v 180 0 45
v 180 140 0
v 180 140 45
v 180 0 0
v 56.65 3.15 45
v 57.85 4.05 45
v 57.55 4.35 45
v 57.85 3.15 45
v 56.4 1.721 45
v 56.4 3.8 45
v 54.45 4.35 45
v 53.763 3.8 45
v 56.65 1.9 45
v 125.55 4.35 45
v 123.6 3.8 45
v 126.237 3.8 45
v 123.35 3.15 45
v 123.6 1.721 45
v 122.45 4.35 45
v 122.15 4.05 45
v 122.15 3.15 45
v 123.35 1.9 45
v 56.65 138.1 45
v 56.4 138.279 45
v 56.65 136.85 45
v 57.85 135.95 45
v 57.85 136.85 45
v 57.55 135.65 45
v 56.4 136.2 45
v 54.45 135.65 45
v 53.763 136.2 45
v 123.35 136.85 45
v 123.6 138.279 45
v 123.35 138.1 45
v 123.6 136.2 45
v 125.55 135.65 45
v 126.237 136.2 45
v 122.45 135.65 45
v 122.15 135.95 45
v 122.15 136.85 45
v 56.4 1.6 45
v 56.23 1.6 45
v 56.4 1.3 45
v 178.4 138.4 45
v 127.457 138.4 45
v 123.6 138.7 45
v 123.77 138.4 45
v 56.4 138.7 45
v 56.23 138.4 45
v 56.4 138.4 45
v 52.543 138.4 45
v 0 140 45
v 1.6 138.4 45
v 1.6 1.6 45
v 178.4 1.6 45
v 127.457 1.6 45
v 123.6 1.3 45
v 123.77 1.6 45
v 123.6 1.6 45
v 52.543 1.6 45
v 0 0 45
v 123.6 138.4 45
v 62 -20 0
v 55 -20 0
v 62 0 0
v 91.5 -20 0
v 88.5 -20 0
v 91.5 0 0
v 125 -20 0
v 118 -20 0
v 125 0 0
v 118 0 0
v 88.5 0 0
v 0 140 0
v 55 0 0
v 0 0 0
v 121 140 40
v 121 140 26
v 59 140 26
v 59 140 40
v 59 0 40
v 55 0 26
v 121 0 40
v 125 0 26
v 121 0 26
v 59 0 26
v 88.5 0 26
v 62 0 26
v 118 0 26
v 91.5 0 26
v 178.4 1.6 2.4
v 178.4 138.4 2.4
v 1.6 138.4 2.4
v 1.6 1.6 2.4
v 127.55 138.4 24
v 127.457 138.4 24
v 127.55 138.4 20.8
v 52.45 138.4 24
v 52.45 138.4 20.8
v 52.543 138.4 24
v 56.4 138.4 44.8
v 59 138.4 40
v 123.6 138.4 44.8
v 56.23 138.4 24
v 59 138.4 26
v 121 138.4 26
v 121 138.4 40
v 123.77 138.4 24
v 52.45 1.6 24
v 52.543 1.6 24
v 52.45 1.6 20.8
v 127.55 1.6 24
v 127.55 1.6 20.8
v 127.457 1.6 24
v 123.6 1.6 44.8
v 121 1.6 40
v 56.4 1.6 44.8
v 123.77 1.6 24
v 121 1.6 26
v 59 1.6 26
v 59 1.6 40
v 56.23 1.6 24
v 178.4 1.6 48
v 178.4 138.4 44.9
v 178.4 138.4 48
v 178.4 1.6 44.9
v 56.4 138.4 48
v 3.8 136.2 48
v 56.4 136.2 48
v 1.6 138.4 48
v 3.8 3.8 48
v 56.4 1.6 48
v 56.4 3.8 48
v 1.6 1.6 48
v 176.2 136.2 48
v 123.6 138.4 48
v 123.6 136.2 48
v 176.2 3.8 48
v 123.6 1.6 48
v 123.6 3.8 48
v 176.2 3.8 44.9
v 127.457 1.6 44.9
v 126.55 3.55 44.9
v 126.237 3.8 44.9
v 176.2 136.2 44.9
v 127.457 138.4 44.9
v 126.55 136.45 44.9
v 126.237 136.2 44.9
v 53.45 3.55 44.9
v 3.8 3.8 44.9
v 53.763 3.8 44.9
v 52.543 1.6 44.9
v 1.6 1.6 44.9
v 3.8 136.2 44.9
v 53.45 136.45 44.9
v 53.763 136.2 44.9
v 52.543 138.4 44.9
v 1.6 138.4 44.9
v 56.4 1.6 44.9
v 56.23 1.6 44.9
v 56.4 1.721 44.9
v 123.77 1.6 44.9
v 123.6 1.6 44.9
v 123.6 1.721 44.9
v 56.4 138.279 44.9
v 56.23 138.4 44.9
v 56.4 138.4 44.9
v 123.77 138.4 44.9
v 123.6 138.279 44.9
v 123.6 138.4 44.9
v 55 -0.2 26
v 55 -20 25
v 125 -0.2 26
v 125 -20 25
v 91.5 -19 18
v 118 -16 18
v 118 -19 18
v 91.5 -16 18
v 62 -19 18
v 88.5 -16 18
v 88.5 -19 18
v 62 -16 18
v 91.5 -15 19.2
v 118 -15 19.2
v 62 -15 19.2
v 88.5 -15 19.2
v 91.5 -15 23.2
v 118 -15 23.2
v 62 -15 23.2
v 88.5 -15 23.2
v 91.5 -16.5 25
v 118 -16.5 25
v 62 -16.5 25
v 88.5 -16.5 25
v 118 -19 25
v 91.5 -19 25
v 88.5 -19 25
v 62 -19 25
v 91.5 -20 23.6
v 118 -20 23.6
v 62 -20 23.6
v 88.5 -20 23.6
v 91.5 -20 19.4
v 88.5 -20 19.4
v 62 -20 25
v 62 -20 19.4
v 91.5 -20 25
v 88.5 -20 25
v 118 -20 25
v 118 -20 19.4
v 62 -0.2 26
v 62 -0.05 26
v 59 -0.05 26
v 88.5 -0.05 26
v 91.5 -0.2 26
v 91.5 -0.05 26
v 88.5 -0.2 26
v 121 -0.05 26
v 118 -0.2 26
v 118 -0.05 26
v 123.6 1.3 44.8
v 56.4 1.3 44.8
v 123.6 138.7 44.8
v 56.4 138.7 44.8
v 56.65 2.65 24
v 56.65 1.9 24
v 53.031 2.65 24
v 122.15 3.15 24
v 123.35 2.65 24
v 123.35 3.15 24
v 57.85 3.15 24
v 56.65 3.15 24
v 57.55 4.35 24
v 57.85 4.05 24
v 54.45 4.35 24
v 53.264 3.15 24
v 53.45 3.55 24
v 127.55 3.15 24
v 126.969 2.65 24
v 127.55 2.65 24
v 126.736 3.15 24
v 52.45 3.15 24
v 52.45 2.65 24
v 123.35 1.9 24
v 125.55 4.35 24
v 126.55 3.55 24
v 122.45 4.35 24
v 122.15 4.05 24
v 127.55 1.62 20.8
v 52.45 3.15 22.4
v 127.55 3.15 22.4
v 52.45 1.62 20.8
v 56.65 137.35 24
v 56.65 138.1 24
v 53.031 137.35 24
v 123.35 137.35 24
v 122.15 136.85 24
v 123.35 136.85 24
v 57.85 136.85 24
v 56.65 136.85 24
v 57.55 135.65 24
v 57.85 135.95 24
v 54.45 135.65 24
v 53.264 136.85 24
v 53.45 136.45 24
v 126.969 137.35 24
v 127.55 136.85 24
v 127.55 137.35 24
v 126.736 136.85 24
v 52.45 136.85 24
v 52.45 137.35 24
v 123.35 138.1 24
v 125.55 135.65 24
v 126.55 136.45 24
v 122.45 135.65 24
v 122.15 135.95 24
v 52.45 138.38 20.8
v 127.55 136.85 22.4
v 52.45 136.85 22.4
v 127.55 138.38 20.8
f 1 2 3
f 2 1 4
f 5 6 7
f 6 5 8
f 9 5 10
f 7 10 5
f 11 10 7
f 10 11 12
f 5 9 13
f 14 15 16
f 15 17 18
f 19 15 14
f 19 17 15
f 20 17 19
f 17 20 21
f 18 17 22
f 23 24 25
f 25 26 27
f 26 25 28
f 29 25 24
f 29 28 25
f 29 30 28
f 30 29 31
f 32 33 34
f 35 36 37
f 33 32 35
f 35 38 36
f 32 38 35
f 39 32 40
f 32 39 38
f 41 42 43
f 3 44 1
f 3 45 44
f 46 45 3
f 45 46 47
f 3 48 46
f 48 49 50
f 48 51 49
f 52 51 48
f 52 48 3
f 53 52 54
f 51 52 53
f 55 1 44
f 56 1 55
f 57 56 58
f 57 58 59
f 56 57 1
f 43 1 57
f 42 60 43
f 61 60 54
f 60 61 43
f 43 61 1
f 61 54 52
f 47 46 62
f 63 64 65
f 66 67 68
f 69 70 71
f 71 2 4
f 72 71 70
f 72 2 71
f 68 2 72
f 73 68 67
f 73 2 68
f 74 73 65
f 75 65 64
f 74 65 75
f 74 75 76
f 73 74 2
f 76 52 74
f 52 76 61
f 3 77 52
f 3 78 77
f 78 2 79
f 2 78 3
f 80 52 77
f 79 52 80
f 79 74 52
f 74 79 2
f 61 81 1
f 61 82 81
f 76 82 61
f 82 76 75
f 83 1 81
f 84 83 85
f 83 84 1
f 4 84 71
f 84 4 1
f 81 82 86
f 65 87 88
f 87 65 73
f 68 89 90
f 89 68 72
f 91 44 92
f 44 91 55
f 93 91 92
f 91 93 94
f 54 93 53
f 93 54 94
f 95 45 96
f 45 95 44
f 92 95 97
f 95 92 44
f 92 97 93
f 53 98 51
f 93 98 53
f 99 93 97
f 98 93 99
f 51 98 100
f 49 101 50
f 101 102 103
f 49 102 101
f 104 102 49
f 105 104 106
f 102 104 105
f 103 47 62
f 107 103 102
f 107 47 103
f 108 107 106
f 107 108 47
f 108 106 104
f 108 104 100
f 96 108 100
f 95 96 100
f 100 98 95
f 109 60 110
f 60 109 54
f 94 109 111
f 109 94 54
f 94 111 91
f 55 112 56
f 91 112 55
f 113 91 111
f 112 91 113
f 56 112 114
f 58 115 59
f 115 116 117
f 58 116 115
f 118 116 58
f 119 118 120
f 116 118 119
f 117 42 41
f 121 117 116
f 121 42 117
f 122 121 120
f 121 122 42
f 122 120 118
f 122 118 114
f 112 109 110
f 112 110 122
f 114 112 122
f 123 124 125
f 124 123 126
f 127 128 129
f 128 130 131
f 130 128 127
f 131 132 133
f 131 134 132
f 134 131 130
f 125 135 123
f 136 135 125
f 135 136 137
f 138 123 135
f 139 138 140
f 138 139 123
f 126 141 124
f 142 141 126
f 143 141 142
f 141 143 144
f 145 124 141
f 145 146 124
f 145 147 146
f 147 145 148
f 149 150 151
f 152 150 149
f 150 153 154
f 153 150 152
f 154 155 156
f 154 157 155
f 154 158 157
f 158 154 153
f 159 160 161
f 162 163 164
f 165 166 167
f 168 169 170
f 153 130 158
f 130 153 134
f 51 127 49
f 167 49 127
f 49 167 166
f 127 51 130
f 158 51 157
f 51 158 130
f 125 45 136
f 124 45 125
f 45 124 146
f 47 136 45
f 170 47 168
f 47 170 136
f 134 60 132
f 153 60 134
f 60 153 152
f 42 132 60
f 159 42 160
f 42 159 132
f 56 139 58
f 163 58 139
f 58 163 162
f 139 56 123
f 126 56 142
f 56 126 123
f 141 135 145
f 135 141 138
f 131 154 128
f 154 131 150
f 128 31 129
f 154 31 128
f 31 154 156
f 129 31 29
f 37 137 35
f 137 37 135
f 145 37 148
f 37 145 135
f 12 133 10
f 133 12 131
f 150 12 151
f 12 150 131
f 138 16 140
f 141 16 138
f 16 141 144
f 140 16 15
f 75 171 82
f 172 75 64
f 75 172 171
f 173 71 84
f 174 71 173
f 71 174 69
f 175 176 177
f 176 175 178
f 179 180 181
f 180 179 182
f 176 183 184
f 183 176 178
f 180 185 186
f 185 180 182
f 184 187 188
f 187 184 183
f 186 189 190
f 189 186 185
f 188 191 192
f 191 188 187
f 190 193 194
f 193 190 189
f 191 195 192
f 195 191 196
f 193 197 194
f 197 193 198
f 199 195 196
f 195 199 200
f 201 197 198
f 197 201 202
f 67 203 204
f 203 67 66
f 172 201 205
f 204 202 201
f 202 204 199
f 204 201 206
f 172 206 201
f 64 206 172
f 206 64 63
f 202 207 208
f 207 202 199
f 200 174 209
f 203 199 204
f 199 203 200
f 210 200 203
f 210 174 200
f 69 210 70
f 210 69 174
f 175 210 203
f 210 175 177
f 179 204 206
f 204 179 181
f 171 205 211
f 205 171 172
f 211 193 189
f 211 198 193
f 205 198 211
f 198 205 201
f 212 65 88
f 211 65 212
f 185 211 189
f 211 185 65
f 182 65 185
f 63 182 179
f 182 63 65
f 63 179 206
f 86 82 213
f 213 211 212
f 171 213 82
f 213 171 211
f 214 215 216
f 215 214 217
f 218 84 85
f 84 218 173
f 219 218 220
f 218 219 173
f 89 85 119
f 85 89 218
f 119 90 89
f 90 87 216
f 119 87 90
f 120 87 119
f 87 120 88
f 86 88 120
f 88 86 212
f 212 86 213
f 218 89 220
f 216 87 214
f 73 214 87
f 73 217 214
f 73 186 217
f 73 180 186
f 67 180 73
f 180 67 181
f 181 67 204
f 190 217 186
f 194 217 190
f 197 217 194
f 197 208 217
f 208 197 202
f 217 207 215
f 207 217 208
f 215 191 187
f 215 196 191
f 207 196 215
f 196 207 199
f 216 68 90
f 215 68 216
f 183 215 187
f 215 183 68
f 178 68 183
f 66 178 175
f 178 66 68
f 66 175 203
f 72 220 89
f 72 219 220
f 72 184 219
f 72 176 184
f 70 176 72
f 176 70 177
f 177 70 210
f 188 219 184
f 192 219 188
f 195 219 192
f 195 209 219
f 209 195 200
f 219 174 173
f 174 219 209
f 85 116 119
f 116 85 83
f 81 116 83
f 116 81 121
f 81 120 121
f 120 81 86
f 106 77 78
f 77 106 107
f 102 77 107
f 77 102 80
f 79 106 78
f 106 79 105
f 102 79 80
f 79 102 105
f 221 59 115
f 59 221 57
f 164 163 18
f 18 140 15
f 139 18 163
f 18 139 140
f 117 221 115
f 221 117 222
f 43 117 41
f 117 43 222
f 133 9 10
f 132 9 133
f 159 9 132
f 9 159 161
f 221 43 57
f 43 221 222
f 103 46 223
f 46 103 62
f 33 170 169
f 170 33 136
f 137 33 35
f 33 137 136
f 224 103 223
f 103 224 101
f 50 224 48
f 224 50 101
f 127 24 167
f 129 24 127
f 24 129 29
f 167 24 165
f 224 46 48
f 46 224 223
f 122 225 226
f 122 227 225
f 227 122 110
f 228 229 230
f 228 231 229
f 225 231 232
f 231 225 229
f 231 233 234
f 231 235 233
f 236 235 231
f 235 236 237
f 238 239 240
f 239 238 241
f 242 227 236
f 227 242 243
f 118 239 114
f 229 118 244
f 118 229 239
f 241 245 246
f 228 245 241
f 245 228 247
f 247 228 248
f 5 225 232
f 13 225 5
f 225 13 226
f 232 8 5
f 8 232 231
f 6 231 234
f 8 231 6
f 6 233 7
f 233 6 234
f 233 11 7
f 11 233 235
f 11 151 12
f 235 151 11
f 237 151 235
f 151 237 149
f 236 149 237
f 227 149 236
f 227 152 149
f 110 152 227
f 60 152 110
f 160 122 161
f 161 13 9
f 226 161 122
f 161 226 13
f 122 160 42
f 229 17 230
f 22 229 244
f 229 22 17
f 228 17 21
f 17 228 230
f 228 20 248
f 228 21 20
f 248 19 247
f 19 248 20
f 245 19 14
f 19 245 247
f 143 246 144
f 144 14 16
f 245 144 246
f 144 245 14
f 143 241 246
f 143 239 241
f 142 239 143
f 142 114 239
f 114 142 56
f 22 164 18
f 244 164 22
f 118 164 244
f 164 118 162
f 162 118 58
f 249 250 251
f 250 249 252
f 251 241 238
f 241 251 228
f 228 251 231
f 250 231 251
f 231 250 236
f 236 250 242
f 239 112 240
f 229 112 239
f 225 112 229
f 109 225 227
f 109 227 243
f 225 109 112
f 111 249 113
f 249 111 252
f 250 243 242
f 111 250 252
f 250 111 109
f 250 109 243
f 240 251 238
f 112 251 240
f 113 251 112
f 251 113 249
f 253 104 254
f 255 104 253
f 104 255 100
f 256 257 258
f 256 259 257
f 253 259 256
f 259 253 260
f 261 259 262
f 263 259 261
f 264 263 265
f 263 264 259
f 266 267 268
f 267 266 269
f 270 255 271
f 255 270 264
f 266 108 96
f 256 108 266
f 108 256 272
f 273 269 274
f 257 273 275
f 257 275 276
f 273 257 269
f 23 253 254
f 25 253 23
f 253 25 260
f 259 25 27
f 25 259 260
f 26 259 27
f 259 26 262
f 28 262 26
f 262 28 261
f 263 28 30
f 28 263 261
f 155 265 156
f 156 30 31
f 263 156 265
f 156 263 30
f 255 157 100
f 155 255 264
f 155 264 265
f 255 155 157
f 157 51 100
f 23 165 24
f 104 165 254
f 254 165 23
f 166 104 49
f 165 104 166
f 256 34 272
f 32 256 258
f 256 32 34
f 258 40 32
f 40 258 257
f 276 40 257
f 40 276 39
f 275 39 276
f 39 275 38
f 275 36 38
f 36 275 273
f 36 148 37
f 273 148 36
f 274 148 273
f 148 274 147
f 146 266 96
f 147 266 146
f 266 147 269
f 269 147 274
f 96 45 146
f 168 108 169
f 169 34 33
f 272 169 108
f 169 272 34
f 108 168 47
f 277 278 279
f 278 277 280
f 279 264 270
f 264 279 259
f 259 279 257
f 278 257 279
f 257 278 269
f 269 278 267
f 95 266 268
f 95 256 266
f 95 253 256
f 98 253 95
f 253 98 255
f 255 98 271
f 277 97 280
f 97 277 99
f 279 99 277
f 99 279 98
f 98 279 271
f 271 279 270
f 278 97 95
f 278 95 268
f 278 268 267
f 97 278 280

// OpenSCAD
// Mealworm modular drawer v1.4 — units: mm.
// Target: PETG, 0.4 mm nozzle, 0.20–0.28 mm layer height.
// Export with -D 'part="drawer"|"vent_standard"|"vent_labyrinth"'.
//
// v1.4 corrections after visual review of v1.3:
// - The 70 mm pull becomes a true bridge handle. Fingers enter from below and
//   curl behind a separate chamfered grip bar with 15 mm wall clearance.
// - Two end struts plus one narrow center strut divide the printable bridges.
// - The vent receiver becomes a single tapered U-shaped bezel. Precise capture
//   faces remain, but all exposed shoulders blend back into the drawer wall.
// - The raised inner rim remains 2.2 mm thick and 3.0 mm high; smallest-larva
//   containment has not been tested.
// - The 66 x 4 x 18 mm cartridge envelope and nominal 0.60 mm slots remain.

$fn = 36;
part = "drawer";

// Frozen drawer envelope.
W = 180;
D = 140;
H = 48;
wall = 1.6;
floor_t = 2.4;

// Reinforced raised inner rim.
rim_h = 3.0;
body_h = H-rim_h;
lip_t = 2.2;

// Vent cartridge interface.
vent_open_w = 62;
vent_open_h = 14;
vent_open_z = 26;
module_w = 66;
module_h = 18;
module_z = 24;
module_flange_t = 1.2;
module_depth = 4.0;
slot_w = 0.60;
rib_w = 0.80;

// 70 mm wide bridge handle with a real finger-under clearance.
handle_x0 = 55;
handle_x1 = 125;
handle_bar_front = -20;
handle_bar_rear = -15;
handle_bar_z0 = 18;
handle_bar_z1 = 25;

module grip_bar() {
    // Chamfered 5 x 9 mm grip section. The flat-to-flat dimensions remain
    // comfortable to hook while avoiding a sharp rectangular lower edge.
    polyhedron(
        points=[
            [handle_x0,-19.0,18.0],
            [handle_x0,-16.0,18.0],
            [handle_x0,-15.0,19.2],
            [handle_x0,-15.0,23.2],
            [handle_x0,-16.5,25.0],
            [handle_x0,-19.0,25.0],
            [handle_x0,-20.0,23.6],
            [handle_x0,-20.0,19.4],

            [handle_x1,-19.0,18.0],
            [handle_x1,-16.0,18.0],
            [handle_x1,-15.0,19.2],
            [handle_x1,-15.0,23.2],
            [handle_x1,-16.5,25.0],
            [handle_x1,-19.0,25.0],
            [handle_x1,-20.0,23.6],
            [handle_x1,-20.0,19.4]
        ],
        faces=[
            [7,6,5,4,3,2,1,0],
            [8,9,10,11,12,13,14,15],
            [0,1,9,8],
            [1,2,10,9],
            [2,3,11,10],
            [3,4,12,11],
            [4,5,13,12],
            [5,6,14,13],
            [6,7,15,14],
            [7,0,8,15]
        ], convexity=6
    );
}

module handle_strut(x0,w) {
    // A narrow bed-contacting fin runs from the drawer wall to the grip. The
    // handle therefore does not begin in mid-air even with 15 mm finger space.
    hull() {
        translate([x0,-0.20,0])
            cube([w,0.40,26]);
        translate([x0,handle_bar_front,0])
            cube([w,-handle_bar_front,0.80]);
        translate([x0,handle_bar_front,handle_bar_z0])
            cube([w,handle_bar_rear-handle_bar_front,
                  handle_bar_z1-handle_bar_z0]);
    }
}

module pull_handle() {
    union() {
        grip_bar();
        handle_strut(handle_x0,7);
        handle_strut(88.5,3);
        handle_strut(handle_x1-7,7);
    }
}

// Reinforced receiver geometry.
rail_side_clearance = 0.35;
rail_h = body_h-module_z;
capture_x = 1.20;
retaining_lip_y = 1.20;
flange_channel_clearance = 0.35;
bottom_stop_h = 1.60;
rail_blend_x = 4.20;

module tapered_rail_profile(left_inner,guide_y0,channel_back_y,rail_outer_y) {
    // One continuous printable profile replaces separate guide and lip blocks.
    // The inner faces preserve cartridge clearance; the outer faces form a
    // broad, sloped shoulder that grows naturally from the drawer wall.
    translate([0,0,module_z])
        linear_extrude(height=rail_h)
            polygon(points=[
                [left_inner-rail_blend_x, guide_y0],
                [left_inner-0.70, guide_y0],
                [left_inner, guide_y0+0.50],
                [left_inner, channel_back_y],
                [left_inner+capture_x, channel_back_y],
                [left_inner+capture_x, rail_outer_y-0.30],
                [left_inner+capture_x-0.30, rail_outer_y],
                [left_inner-2.20, rail_outer_y],
                [left_inner-3.20, rail_outer_y-0.80]
            ]);
}

module cartridge_rails_front() {
    x0=(W-module_w)/2;
    left_inner=x0-rail_side_clearance;
    channel_back_y=wall+module_flange_t+flange_channel_clearance;
    rail_outer_y=channel_back_y+retaining_lip_y;
    guide_y0=wall-0.2;
    left_outer=left_inner-rail_blend_x;
    right_outer=W-left_outer;
    bezel_w=right_outer-left_outer;

    union() {
        // Identical tapered side profiles, mirrored about the drawer center.
        tapered_rail_profile(left_inner,guide_y0,channel_back_y,rail_outer_y);
        translate([W,0,0]) mirror([1,0,0])
            tapered_rail_profile(left_inner,guide_y0,channel_back_y,rail_outer_y);

        // One tapered lower sill replaces the former rectangular stop plus
        // separate gusset. Its horizontal top locates the cartridge, while
        // the exposed underside blends continuously back into the wall.
        hull() {
            translate([left_outer,guide_y0,module_z-bottom_stop_h-1.60])
                cube([bezel_w,0.22,bottom_stop_h+1.60]);
            translate([left_outer,channel_back_y-0.50,
                       module_z-bottom_stop_h])
                cube([bezel_w,0.50,bottom_stop_h]);
        }
    }
}

module drawer_shell() {
    union() {
        difference() {
            union() {
                difference() {
                    cube([W,D,body_h]);
                    translate([wall,wall,floor_t])
                        cube([W-2*wall,D-2*wall,body_h-floor_t+0.1]);
                }

                // Reinforced raised inner lip: 2.2 mm thick x 3.0 mm high.
                translate([wall,wall,body_h-0.1])
                    difference() {
                        cube([W-2*wall,D-2*wall,rim_h+0.1]);
                        translate([lip_t,lip_t,-0.05])
                            cube([W-2*(wall+lip_t),D-2*(wall+lip_t),rim_h+0.2]);
                    }

                pull_handle();
            }

            // Standardized front and rear cartridge apertures.
            translate([(W-vent_open_w)/2,-0.05,vent_open_z])
                cube([vent_open_w,wall+0.1,vent_open_h]);
            translate([(W-vent_open_w)/2,D-wall-0.05,vent_open_z])
                cube([vent_open_w,wall+0.1,vent_open_h]);

            // Open the reinforced top rim only over the two cartridge channels.
            // The surrounding rim remains a full 2.2 mm thick.
            translate([(W-module_w)/2-rail_side_clearance-0.25,
                       wall-0.3,body_h-0.2])
                cube([module_w+2*rail_side_clearance+0.5,
                      module_flange_t+flange_channel_clearance+
                      retaining_lip_y+0.6,
                      rim_h+0.4]);
            translate([(W-module_w)/2-rail_side_clearance-0.25,
                       D-wall-module_flange_t-flange_channel_clearance-
                       retaining_lip_y-0.3,
                       body_h-0.2])
                cube([module_w+2*rail_side_clearance+0.5,
                      module_flange_t+flange_channel_clearance+
                      retaining_lip_y+0.6,
                      rim_h+0.4]);
        }

        cartridge_rails_front();
        translate([0,D,0]) mirror([0,1,0]) cartridge_rails_front();
    }
}

module slotted_panel(y0, offset=0) {
    pitch=slot_w+rib_w;
    difference() {
        translate([0,y0,0]) cube([module_w,module_flange_t,module_h]);
        for(x=[2+offset:pitch:module_w-2-slot_w])
            translate([x,y0-0.05,2])
                cube([slot_w,module_flange_t+0.1,module_h-4]);
    }
}

module perimeter_spacer() {
    d=module_depth-module_flange_t+0.1;
    translate([2,module_flange_t-0.1,2]) cube([module_w-4,d,2]);
    translate([2,module_flange_t-0.1,module_h-4]) cube([module_w-4,d,2]);
    translate([2,module_flange_t-0.1,4]) cube([2,d,module_h-8]);
    translate([module_w-4,module_flange_t-0.1,4]) cube([2,d,module_h-8]);
}

module vent_standard() {
    union() {
        slotted_panel(0,0);
        perimeter_spacer();
    }
}

module vent_labyrinth() {
    union() {
        slotted_panel(0,0);
        perimeter_spacer();
        slotted_panel(module_depth-module_flange_t,(slot_w+rib_w)/2);
    }
}

module front_cartridge_assembled() {
    cartridge_y=wall+flange_channel_clearance/2;
    translate([(W-module_w)/2,cartridge_y,module_z]) vent_labyrinth();
}

module fit_check_front_cartridge() {
    intersection() {
        drawer_shell();
        front_cartridge_assembled();
    }
}

module assembly_preview() {
    color([0.68,0.38,0.16]) drawer_shell();
    color([0.00,0.42,0.46]) front_cartridge_assembled();
    color([0.00,0.42,0.46])
        translate([(W-module_w)/2,D-wall-flange_channel_clearance/2,module_z])
            mirror([0,1,0]) vent_labyrinth();
}

module handle_detail() {
    intersection() {
        drawer_shell();
        translate([45,handle_bar_front-0.5,0])
            cube([90,-handle_bar_front+5,31]);
    }
}

module rail_detail() {
    intersection() {
        drawer_shell();
        translate([50,0.30,20]) cube([80,7,28.5]);
    }
}

if (part=="drawer") drawer_shell();
else if (part=="vent_standard") vent_standard();
else if (part=="vent_labyrinth") vent_labyrinth();
else if (part=="fit_check_front_cartridge") fit_check_front_cartridge();
else if (part=="assembly_preview") assembly_preview();
else if (part=="handle_detail") handle_detail();
else if (part=="rail_detail") rail_detail();
else assert(false,"Unknown part");
